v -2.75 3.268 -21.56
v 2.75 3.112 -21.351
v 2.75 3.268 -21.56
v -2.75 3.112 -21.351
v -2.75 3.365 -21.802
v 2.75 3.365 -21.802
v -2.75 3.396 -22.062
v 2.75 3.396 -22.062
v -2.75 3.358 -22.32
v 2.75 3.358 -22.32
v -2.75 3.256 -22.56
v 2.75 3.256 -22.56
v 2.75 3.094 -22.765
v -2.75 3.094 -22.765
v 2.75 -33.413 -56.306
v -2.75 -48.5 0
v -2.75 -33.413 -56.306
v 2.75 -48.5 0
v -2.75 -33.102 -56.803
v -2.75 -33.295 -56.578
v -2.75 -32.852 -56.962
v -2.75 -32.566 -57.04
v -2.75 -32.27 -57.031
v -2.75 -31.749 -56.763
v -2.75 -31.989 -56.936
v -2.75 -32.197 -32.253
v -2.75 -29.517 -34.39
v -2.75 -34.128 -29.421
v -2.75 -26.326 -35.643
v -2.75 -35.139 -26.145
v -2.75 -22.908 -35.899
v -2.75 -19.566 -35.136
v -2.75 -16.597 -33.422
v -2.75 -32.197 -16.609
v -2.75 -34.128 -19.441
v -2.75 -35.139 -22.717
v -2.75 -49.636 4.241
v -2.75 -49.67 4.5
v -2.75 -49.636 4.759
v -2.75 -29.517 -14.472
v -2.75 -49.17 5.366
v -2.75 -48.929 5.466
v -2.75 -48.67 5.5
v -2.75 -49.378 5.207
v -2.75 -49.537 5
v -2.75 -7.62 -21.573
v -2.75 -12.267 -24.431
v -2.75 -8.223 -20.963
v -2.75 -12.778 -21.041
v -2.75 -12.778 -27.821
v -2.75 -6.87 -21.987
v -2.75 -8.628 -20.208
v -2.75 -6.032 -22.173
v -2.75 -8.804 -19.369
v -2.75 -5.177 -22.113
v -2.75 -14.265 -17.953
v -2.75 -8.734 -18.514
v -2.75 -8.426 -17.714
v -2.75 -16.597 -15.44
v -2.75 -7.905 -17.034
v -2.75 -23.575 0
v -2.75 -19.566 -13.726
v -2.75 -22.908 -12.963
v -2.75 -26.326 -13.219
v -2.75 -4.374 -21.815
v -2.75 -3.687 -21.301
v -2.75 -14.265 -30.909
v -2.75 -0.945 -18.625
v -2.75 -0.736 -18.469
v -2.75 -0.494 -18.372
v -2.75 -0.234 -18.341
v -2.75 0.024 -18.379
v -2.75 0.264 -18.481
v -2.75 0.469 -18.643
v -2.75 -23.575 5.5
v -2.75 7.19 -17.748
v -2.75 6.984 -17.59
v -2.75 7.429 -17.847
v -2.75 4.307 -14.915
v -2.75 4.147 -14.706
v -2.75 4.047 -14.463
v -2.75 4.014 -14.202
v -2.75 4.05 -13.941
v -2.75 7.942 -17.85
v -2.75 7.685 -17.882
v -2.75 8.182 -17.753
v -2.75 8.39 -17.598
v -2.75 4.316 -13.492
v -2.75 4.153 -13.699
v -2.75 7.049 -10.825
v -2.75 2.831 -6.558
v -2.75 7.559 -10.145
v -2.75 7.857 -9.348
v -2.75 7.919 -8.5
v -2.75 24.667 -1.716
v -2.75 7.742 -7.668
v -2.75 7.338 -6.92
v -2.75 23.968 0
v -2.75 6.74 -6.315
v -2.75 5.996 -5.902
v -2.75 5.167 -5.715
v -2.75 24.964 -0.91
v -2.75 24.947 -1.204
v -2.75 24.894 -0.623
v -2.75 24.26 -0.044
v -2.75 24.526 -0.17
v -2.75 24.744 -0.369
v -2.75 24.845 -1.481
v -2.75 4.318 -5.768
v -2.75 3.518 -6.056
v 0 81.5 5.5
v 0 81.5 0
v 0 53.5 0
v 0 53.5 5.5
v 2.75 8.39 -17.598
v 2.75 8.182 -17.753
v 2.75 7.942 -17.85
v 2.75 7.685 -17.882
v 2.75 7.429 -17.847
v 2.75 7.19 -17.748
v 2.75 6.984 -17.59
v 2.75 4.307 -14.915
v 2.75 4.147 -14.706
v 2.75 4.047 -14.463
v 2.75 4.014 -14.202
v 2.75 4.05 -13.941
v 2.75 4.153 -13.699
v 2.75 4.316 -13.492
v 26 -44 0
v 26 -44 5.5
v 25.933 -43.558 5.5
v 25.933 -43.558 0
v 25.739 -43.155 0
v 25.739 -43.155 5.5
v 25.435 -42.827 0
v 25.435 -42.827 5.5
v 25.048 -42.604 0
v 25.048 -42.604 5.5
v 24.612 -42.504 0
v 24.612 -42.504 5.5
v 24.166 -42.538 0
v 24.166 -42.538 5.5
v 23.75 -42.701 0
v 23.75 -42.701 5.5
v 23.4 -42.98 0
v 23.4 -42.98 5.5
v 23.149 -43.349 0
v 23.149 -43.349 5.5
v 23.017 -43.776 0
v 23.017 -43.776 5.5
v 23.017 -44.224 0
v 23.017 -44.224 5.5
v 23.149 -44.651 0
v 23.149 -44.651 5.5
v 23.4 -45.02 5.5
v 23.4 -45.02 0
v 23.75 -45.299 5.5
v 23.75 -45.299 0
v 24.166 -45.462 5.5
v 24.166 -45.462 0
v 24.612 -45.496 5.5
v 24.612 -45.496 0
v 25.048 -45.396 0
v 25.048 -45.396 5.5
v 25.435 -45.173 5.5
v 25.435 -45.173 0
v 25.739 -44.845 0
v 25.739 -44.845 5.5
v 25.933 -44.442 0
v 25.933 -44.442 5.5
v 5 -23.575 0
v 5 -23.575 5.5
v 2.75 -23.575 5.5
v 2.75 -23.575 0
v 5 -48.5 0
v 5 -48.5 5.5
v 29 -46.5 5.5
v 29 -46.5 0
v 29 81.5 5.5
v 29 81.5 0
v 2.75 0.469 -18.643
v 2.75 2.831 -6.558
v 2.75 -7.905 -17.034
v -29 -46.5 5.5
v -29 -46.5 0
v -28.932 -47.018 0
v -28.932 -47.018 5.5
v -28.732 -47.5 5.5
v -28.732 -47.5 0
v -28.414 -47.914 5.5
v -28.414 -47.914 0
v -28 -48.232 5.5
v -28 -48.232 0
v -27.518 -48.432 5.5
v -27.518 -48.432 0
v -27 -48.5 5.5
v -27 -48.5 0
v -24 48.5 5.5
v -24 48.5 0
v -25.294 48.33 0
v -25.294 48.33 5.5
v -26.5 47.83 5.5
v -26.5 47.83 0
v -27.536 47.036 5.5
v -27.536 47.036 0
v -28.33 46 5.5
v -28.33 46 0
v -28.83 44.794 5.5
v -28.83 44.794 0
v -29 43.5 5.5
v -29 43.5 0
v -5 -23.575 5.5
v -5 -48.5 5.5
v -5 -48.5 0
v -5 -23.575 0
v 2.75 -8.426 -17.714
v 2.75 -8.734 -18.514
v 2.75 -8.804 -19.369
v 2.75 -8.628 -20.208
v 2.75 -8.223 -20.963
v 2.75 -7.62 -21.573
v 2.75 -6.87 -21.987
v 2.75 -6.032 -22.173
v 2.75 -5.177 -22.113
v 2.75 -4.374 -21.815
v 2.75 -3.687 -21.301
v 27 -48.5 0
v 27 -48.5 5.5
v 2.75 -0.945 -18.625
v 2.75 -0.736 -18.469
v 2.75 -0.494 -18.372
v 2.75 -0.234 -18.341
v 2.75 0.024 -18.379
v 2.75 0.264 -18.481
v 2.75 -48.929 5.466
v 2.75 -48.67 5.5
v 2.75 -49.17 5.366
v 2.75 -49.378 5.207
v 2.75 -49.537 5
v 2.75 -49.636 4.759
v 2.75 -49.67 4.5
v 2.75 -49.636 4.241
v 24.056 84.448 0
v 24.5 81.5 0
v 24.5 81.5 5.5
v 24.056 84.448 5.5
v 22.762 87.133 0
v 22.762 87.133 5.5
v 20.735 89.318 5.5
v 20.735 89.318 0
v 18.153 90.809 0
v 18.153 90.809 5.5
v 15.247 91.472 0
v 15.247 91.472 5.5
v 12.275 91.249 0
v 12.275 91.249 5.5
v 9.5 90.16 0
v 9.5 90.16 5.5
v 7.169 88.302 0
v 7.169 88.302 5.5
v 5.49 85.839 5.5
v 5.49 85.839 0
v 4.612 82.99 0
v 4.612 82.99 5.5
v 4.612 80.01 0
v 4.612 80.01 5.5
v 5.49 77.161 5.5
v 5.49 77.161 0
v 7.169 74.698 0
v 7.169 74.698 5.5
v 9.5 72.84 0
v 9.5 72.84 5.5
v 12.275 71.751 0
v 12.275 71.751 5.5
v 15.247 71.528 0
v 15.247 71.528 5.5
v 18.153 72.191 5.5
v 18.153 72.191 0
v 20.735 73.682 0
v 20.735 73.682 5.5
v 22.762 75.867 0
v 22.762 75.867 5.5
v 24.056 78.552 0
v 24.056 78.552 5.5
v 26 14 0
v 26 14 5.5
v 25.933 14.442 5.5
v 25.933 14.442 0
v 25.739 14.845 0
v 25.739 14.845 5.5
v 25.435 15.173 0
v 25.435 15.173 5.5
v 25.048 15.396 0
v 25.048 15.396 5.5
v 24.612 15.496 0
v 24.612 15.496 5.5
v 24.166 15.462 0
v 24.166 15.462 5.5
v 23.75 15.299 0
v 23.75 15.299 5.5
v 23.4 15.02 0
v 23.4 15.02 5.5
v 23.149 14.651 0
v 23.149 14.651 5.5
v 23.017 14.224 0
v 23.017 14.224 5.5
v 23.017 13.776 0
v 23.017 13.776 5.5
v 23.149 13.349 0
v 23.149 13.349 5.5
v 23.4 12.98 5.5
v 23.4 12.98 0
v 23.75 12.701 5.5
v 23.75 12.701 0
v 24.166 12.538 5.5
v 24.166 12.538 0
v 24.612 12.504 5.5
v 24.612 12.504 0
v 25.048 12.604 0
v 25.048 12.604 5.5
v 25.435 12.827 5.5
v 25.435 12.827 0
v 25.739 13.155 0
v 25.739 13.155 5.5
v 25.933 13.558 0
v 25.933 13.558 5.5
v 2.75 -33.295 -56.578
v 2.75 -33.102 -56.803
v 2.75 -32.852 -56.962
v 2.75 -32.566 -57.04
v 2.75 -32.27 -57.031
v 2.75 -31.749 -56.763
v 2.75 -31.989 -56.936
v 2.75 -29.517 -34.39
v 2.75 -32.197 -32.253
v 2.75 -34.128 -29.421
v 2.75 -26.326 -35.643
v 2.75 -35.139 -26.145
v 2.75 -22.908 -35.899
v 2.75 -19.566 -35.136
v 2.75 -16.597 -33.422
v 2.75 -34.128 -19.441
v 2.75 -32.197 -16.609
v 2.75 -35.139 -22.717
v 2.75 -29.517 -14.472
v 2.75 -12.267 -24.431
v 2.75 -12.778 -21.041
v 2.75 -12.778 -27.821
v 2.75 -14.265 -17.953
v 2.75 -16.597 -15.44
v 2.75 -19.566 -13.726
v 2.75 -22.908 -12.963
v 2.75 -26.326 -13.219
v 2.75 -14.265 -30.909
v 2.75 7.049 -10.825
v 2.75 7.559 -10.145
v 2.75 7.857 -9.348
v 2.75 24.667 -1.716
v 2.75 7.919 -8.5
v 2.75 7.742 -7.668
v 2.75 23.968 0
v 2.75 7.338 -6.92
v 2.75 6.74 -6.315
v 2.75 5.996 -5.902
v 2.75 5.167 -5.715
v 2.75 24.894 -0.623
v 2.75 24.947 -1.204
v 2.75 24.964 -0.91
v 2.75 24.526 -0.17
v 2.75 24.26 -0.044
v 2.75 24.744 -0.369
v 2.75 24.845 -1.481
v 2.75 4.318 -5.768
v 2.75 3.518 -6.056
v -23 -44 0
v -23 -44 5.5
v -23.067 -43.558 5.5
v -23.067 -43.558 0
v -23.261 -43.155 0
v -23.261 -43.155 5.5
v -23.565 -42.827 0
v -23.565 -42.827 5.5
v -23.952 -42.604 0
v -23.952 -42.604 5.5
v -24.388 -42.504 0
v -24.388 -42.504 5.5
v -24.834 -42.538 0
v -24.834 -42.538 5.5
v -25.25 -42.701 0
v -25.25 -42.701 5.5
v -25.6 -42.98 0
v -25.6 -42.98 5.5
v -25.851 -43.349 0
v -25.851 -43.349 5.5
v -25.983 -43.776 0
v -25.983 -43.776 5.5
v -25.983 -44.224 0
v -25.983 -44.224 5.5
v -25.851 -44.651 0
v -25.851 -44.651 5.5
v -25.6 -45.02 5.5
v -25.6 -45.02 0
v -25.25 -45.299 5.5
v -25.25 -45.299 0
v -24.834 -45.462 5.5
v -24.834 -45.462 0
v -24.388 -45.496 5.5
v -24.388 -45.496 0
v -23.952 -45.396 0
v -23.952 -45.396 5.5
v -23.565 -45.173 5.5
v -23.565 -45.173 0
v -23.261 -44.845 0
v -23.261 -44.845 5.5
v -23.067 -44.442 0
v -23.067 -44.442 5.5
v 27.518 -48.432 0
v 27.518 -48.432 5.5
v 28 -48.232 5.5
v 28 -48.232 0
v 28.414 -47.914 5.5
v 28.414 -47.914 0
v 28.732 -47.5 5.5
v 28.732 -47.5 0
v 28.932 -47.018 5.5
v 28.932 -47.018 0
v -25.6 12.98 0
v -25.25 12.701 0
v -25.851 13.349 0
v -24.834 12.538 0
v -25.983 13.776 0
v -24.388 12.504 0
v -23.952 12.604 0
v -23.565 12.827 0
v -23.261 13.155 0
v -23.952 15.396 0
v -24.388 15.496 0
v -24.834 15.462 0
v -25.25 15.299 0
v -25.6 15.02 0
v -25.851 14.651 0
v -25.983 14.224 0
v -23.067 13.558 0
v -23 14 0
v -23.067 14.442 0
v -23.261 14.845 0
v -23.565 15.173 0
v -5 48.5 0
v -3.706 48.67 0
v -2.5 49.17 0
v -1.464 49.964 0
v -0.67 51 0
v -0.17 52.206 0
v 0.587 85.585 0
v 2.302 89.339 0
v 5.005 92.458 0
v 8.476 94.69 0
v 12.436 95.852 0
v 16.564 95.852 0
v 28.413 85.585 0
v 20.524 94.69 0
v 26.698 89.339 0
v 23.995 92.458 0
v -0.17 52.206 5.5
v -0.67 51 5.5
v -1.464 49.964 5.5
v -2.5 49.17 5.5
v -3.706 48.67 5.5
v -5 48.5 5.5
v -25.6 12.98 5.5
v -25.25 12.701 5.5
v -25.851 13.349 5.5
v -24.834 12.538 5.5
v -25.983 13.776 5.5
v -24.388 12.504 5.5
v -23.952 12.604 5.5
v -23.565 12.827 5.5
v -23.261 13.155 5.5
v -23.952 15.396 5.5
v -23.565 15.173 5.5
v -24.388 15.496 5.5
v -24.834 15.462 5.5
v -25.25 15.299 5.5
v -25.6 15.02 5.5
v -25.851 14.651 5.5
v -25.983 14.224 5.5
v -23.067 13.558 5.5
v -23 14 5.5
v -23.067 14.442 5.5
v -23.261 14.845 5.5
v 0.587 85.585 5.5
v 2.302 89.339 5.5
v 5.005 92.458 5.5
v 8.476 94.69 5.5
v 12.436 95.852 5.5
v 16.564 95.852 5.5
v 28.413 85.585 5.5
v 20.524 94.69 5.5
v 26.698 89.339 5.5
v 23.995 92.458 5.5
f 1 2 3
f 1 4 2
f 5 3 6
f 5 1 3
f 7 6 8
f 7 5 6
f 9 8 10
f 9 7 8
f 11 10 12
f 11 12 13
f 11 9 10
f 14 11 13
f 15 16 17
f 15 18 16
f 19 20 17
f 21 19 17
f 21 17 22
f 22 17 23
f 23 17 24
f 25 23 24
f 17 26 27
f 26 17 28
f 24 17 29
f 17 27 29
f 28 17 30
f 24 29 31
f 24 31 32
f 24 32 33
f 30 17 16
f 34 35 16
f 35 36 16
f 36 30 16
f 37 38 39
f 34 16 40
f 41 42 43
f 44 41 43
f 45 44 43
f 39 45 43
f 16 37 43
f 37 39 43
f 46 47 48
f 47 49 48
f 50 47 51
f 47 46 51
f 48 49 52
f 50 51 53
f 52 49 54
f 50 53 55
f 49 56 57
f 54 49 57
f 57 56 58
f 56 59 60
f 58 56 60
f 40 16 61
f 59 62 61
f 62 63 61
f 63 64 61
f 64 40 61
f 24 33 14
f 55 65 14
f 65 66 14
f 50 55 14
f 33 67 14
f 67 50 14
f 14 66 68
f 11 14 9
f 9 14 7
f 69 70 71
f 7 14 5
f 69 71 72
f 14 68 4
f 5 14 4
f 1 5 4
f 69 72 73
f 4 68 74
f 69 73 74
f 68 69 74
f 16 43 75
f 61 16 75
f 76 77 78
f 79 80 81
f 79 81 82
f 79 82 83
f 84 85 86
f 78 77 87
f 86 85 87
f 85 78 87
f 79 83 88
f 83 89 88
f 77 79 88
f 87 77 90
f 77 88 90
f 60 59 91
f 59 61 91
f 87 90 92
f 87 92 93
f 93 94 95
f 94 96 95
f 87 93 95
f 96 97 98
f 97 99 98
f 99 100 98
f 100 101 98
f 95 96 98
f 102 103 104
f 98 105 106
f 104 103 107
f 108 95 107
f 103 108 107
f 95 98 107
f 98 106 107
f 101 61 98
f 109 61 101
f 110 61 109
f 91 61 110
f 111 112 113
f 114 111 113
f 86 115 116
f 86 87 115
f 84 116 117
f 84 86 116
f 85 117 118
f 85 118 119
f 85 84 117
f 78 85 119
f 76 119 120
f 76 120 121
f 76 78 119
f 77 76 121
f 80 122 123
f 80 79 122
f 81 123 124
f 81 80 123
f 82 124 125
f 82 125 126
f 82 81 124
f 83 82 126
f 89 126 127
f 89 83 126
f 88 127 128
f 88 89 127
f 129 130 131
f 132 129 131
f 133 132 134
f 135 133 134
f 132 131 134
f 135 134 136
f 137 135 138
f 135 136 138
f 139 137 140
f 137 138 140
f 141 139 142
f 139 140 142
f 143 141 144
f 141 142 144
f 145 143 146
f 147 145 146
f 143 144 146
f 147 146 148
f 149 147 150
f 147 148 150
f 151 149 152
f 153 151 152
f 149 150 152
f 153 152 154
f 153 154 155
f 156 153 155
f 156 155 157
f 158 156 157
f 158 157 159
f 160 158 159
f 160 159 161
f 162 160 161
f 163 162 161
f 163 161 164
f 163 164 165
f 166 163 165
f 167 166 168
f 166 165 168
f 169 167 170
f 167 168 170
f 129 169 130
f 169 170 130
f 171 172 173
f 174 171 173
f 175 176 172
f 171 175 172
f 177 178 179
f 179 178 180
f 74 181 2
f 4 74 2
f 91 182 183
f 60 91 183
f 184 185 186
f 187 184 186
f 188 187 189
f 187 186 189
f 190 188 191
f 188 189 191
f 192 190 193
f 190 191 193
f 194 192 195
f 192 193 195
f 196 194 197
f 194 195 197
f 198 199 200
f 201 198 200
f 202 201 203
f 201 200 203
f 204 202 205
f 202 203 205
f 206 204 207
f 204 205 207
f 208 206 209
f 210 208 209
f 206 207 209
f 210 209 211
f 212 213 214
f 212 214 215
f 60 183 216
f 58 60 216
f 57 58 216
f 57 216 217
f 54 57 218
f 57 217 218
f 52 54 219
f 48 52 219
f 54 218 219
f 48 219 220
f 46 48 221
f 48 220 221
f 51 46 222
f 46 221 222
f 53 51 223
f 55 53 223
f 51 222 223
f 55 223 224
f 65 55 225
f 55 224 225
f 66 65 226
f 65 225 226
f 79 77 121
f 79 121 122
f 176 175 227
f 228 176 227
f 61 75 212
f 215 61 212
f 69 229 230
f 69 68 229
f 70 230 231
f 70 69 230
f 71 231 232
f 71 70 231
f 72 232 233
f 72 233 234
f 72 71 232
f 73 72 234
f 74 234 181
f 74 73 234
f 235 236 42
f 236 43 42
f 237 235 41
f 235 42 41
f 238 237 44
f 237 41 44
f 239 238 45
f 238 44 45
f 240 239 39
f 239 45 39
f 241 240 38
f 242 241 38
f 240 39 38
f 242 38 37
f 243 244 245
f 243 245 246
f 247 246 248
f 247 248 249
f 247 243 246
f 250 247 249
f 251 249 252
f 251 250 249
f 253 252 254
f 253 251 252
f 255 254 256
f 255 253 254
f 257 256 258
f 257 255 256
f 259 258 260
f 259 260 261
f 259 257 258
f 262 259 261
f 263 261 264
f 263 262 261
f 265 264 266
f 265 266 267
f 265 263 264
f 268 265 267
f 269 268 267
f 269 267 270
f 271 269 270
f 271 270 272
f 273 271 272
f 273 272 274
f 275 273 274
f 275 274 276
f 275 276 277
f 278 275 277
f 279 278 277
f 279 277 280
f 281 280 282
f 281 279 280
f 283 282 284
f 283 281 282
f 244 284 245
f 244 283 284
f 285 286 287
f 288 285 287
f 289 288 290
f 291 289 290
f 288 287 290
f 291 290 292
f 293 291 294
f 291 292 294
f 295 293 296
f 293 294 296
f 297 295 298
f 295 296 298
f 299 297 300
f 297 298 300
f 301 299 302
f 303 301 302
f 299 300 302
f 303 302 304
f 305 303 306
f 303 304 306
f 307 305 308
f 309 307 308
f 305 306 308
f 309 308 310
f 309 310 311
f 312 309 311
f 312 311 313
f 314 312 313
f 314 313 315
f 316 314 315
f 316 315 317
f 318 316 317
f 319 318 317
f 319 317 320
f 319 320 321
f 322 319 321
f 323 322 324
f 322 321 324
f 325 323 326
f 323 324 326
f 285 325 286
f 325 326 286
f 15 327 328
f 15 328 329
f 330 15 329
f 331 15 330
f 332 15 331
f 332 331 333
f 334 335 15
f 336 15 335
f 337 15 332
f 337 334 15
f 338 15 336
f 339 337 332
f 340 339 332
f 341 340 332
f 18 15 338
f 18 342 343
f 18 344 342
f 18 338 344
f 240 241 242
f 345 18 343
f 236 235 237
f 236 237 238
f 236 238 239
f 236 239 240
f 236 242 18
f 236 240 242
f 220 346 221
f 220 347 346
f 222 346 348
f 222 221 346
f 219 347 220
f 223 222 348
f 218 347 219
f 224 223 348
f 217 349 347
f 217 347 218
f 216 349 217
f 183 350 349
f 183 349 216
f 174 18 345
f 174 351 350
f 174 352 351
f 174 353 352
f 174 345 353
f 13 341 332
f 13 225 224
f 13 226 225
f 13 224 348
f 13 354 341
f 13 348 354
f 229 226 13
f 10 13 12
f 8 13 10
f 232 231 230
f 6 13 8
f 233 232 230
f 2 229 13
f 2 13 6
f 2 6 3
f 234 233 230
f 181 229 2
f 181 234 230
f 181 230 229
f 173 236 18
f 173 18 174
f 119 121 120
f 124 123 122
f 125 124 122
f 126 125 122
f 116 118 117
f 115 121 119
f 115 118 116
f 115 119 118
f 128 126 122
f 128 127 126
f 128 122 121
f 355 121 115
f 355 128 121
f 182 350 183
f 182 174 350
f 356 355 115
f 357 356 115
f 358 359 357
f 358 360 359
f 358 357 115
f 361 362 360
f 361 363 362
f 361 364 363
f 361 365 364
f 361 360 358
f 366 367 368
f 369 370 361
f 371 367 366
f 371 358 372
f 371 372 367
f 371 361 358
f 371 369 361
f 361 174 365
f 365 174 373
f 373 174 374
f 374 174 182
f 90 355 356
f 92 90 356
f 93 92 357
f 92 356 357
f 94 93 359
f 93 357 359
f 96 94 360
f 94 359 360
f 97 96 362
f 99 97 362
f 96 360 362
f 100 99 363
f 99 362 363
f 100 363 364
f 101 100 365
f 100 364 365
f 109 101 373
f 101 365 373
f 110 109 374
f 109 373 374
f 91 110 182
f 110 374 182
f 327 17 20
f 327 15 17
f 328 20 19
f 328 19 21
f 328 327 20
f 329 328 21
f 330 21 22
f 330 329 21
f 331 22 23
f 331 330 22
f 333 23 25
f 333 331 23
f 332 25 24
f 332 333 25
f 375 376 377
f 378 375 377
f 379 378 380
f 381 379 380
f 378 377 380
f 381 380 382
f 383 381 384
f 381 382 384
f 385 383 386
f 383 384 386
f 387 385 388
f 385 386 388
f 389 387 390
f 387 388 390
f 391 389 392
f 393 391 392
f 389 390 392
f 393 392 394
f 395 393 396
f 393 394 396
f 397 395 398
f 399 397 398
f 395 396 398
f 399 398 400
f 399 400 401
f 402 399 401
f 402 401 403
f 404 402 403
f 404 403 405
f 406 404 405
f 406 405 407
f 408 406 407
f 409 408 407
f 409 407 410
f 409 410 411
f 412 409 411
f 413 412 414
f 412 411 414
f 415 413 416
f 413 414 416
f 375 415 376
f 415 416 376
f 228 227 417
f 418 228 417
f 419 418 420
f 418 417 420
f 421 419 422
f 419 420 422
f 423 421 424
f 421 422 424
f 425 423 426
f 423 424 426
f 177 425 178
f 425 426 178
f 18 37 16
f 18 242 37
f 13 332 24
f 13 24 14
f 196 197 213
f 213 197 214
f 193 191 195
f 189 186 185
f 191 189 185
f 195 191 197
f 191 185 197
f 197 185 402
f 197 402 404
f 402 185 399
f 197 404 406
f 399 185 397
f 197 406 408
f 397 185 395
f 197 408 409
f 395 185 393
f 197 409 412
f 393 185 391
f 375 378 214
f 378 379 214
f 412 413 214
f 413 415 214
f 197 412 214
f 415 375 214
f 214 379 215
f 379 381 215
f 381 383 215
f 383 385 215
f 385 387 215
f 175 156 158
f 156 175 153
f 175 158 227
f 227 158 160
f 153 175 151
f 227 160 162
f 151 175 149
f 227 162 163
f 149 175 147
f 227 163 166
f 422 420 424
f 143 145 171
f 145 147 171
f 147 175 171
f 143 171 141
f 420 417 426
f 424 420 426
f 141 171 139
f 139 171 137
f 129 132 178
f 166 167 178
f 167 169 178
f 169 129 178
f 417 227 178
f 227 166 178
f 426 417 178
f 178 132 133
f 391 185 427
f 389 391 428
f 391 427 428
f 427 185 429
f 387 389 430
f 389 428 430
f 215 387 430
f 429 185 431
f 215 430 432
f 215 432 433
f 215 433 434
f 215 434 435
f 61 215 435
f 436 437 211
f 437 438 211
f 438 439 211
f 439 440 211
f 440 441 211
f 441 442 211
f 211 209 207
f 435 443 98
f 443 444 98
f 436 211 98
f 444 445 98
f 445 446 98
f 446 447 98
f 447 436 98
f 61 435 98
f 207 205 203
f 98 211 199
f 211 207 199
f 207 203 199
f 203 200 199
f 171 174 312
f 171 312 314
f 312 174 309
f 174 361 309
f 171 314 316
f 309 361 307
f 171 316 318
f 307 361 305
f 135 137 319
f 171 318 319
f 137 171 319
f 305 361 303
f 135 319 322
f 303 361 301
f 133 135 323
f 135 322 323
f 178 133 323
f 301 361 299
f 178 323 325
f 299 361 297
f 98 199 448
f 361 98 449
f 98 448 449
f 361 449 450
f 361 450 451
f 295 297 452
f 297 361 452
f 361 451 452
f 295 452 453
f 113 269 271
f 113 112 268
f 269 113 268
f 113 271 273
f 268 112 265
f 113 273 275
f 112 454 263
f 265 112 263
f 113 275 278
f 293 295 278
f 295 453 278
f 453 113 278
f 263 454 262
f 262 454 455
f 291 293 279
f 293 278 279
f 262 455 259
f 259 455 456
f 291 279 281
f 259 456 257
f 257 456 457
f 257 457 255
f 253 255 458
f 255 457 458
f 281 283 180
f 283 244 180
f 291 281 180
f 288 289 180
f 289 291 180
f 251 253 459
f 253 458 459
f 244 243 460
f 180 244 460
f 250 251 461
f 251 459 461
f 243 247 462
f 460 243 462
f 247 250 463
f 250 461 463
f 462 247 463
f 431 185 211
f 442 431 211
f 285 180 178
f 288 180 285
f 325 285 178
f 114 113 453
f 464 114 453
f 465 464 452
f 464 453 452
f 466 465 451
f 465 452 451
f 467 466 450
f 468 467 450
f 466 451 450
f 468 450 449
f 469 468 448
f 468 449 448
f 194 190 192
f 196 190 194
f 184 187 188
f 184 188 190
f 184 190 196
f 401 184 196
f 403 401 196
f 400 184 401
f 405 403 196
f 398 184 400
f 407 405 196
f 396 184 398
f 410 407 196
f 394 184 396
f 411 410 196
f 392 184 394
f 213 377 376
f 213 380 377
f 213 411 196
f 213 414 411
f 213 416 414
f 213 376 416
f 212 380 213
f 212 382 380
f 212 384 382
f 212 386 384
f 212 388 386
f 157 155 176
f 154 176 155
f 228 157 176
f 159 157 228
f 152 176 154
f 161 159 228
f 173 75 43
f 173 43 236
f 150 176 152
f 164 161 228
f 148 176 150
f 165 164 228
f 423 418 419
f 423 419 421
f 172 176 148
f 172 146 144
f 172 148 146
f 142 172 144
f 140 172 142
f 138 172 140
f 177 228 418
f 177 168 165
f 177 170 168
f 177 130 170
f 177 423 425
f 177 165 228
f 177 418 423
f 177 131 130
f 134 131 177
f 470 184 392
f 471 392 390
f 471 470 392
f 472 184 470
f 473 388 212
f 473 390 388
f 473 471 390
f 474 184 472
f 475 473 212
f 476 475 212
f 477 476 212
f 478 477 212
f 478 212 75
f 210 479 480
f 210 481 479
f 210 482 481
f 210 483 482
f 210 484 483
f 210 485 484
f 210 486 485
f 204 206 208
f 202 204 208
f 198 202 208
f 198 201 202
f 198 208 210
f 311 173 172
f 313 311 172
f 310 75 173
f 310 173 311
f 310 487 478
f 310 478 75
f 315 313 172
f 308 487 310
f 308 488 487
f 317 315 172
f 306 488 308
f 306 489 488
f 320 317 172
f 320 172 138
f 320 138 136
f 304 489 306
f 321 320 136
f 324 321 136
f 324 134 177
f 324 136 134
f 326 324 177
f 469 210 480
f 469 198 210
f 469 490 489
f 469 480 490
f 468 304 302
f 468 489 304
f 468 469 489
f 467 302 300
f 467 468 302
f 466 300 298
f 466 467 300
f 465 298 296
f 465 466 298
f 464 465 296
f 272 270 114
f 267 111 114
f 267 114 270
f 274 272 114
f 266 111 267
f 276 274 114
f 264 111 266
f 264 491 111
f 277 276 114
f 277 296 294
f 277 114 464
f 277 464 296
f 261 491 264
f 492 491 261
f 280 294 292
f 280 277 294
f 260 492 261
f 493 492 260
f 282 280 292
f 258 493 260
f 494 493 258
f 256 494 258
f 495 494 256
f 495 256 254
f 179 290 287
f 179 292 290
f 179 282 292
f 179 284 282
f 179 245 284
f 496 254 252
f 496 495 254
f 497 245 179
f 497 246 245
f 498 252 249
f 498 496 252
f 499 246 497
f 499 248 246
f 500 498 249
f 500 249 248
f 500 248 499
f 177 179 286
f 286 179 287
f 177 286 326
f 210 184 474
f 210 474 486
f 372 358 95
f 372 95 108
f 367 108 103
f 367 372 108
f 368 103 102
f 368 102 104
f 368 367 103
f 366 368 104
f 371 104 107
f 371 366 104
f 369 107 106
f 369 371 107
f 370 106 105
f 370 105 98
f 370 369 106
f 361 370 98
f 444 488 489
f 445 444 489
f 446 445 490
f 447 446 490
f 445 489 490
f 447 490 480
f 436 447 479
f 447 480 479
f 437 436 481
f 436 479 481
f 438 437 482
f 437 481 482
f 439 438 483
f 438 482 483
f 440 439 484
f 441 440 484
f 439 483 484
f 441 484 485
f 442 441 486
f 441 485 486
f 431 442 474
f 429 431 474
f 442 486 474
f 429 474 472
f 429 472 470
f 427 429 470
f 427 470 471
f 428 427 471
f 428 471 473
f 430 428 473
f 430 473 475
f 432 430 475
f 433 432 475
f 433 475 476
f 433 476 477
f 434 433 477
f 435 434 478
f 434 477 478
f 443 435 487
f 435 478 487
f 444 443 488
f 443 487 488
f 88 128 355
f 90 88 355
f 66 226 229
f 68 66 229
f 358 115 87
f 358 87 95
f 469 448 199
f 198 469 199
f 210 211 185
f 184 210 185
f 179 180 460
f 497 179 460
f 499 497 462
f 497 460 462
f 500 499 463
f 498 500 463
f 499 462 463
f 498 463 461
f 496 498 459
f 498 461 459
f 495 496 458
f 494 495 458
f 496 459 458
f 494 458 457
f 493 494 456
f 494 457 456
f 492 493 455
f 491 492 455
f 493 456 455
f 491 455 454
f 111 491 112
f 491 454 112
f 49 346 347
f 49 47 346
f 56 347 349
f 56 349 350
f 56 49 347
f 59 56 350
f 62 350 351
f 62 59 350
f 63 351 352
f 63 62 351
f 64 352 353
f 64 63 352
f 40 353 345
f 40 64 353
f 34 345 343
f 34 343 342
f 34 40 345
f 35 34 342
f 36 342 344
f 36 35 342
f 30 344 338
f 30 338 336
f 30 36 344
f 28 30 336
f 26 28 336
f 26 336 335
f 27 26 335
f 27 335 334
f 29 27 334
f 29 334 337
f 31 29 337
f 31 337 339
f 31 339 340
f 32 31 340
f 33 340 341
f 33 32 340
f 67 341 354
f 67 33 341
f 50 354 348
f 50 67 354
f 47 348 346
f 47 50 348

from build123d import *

# Parameters (mm, degrees)
F0_R      = 10
F1_DEPTH  = 5.5
F2_R      = 1.5
F3_DEPTH  = 5.5
F4_W      = 5
F4_H      = 24.9248821884
F5_DEPTH  = 5.5
F6_R      = 11.5
F7_DEPTH  = 2.75
F8_R      = 1
F10_DEPTH = 5.5
F11_R     = 1


with BuildPart() as f1:
    # F0 (on Top) → F1 (new body)
    with BuildSketch(Plane.XY):
        with BuildLine():
            Line((-27, -48.5), (27, -48.5))
            ThreePointArc((27, -48.5), (28.4142135624, -47.9142135624), (29, -46.5))
            Line((29, -46.5), (29, 81.5))
            ThreePointArc((29, 81.5), (14.5, 96), (0, 81.5))
            Line((0, 81.5), (0, 53.5))
            ThreePointArc((0, 53.5), (-1.4644660941, 49.9644660941), (-5, 48.5))
            Line((-5, 48.5), (-24, 48.5))
            ThreePointArc((-24, 48.5), (-27.5355339059, 47.0355339059), (-29, 43.5))
            Line((-29, 43.5), (-29, -46.5))
            ThreePointArc((-29, -46.5), (-28.4142135624, -47.9142135624), (-27, -48.5))
        make_face()
        with Locations((14.5, 81.5)):
            Circle(F0_R, mode=Mode.SUBTRACT)
    extrude(amount=F1_DEPTH)

    # F2 (on face) → F3 (cut, through all)
    with BuildSketch(Plane.XY.offset(5.5)):
        with Locations((-24.5, 14)):
            Circle(F2_R)
        with Locations((24.5, 14)):
            Circle(F2_R)
        with Locations((24.5, -44)):
            Circle(F2_R)
        with Locations((-24.5, -44)):
            Circle(F2_R)
    extrude(amount=-F3_DEPTH, mode=Mode.SUBTRACT)

    # F4 (on face) → F5 (cut, through all)
    with BuildSketch(Plane.XY.offset(5.5)):
        with Locations((2.5, -36.0375589058)):
            Rectangle(F4_W, F4_H)
        with Locations((-2.5, -36.0375589058)):
            Rectangle(F4_W, F4_H)
    extrude(amount=-F5_DEPTH, mode=Mode.SUBTRACT)

    # F6 (on Right) → F7 (join, symmetric)
    with BuildSketch(Plane.YZ):
        with BuildLine():
            Line((-49.9737205584, 5.5), (-48.5, 0))
            Line((-48.5, 0), (-32.9708572938, -57.9555495773))
            Line((-32.9708572938, -57.9555495773), (24.6665156112, -1.715730829))
            ThreePointArc((24.6665156112, -1.715730829), (24.8943496088, -0.6229925922), (23.9681393656, 0))
            Line((23.9681393656, 0), (-23.5751178116, 0))
            Line((-23.5751178116, 0), (-23.5751178116, 5.5))
            Line((-23.5751178116, 5.5), (-48.5, 5.5))
            Line((-48.5, 5.5), (-49.9737205584, 5.5))
        make_face()
        with Locations((-23.7671827683, -24.4311470085)):
            Circle(F6_R, mode=Mode.SUBTRACT)
    extrude(amount=F7_DEPTH, both=True)

    # F8
    f8_edges = [f1.edges().sort_by_distance(p)[0] for p in [
        (0, -49.973721, 5.5),
        (0, -32.970857, -57.95555),
    ]]
    fillet(f8_edges, radius=F8_R)

    # F9 (on face) → F10 (cut, through all)
    with BuildSketch(Plane.YZ.offset(2.75)):
        with BuildLine():
            ThreePointArc((-7.9046124855, -17.0336287316), (-7.9432792247, -21.2895926303), (-3.6871553257, -21.3011330035))
            Line((-3.6871553257, -21.3011330035), (-0.2292870065, -17.9271088638))
            Line((-0.2292870065, -17.9271088638), (3.8098796459, -22.0666484241))
            Line((3.8098796459, -22.0666484241), (7.6828757476, -18.2875622549))
            Line((7.6828757476, -18.2875622549), (3.5909387901, -14.1995134591))
            Line((3.5909387901, -14.1995134591), (7.0488071093, -10.8254893195))
            ThreePointArc((7.0488071093, -10.8254893195), (7.0602741622, -6.596406123), (2.8313499495, -6.5579850476))
            Line((2.8313499495, -6.5579850476), (-7.9046124855, -17.0336287316))
        make_face()
    extrude(amount=-F10_DEPTH, mode=Mode.SUBTRACT)

    # F11
    f11_edges = [f1.edges().sort_by_distance(p)[0] for p in [
        (0, -0.229287, -17.927109),
        (0, 3.590939, -14.199513),
        (0, 7.682876, -18.287562),
        (0, 3.80988, -22.066648),
    ]]
    fillet(f11_edges, radius=F11_R)


solid = f1.part
